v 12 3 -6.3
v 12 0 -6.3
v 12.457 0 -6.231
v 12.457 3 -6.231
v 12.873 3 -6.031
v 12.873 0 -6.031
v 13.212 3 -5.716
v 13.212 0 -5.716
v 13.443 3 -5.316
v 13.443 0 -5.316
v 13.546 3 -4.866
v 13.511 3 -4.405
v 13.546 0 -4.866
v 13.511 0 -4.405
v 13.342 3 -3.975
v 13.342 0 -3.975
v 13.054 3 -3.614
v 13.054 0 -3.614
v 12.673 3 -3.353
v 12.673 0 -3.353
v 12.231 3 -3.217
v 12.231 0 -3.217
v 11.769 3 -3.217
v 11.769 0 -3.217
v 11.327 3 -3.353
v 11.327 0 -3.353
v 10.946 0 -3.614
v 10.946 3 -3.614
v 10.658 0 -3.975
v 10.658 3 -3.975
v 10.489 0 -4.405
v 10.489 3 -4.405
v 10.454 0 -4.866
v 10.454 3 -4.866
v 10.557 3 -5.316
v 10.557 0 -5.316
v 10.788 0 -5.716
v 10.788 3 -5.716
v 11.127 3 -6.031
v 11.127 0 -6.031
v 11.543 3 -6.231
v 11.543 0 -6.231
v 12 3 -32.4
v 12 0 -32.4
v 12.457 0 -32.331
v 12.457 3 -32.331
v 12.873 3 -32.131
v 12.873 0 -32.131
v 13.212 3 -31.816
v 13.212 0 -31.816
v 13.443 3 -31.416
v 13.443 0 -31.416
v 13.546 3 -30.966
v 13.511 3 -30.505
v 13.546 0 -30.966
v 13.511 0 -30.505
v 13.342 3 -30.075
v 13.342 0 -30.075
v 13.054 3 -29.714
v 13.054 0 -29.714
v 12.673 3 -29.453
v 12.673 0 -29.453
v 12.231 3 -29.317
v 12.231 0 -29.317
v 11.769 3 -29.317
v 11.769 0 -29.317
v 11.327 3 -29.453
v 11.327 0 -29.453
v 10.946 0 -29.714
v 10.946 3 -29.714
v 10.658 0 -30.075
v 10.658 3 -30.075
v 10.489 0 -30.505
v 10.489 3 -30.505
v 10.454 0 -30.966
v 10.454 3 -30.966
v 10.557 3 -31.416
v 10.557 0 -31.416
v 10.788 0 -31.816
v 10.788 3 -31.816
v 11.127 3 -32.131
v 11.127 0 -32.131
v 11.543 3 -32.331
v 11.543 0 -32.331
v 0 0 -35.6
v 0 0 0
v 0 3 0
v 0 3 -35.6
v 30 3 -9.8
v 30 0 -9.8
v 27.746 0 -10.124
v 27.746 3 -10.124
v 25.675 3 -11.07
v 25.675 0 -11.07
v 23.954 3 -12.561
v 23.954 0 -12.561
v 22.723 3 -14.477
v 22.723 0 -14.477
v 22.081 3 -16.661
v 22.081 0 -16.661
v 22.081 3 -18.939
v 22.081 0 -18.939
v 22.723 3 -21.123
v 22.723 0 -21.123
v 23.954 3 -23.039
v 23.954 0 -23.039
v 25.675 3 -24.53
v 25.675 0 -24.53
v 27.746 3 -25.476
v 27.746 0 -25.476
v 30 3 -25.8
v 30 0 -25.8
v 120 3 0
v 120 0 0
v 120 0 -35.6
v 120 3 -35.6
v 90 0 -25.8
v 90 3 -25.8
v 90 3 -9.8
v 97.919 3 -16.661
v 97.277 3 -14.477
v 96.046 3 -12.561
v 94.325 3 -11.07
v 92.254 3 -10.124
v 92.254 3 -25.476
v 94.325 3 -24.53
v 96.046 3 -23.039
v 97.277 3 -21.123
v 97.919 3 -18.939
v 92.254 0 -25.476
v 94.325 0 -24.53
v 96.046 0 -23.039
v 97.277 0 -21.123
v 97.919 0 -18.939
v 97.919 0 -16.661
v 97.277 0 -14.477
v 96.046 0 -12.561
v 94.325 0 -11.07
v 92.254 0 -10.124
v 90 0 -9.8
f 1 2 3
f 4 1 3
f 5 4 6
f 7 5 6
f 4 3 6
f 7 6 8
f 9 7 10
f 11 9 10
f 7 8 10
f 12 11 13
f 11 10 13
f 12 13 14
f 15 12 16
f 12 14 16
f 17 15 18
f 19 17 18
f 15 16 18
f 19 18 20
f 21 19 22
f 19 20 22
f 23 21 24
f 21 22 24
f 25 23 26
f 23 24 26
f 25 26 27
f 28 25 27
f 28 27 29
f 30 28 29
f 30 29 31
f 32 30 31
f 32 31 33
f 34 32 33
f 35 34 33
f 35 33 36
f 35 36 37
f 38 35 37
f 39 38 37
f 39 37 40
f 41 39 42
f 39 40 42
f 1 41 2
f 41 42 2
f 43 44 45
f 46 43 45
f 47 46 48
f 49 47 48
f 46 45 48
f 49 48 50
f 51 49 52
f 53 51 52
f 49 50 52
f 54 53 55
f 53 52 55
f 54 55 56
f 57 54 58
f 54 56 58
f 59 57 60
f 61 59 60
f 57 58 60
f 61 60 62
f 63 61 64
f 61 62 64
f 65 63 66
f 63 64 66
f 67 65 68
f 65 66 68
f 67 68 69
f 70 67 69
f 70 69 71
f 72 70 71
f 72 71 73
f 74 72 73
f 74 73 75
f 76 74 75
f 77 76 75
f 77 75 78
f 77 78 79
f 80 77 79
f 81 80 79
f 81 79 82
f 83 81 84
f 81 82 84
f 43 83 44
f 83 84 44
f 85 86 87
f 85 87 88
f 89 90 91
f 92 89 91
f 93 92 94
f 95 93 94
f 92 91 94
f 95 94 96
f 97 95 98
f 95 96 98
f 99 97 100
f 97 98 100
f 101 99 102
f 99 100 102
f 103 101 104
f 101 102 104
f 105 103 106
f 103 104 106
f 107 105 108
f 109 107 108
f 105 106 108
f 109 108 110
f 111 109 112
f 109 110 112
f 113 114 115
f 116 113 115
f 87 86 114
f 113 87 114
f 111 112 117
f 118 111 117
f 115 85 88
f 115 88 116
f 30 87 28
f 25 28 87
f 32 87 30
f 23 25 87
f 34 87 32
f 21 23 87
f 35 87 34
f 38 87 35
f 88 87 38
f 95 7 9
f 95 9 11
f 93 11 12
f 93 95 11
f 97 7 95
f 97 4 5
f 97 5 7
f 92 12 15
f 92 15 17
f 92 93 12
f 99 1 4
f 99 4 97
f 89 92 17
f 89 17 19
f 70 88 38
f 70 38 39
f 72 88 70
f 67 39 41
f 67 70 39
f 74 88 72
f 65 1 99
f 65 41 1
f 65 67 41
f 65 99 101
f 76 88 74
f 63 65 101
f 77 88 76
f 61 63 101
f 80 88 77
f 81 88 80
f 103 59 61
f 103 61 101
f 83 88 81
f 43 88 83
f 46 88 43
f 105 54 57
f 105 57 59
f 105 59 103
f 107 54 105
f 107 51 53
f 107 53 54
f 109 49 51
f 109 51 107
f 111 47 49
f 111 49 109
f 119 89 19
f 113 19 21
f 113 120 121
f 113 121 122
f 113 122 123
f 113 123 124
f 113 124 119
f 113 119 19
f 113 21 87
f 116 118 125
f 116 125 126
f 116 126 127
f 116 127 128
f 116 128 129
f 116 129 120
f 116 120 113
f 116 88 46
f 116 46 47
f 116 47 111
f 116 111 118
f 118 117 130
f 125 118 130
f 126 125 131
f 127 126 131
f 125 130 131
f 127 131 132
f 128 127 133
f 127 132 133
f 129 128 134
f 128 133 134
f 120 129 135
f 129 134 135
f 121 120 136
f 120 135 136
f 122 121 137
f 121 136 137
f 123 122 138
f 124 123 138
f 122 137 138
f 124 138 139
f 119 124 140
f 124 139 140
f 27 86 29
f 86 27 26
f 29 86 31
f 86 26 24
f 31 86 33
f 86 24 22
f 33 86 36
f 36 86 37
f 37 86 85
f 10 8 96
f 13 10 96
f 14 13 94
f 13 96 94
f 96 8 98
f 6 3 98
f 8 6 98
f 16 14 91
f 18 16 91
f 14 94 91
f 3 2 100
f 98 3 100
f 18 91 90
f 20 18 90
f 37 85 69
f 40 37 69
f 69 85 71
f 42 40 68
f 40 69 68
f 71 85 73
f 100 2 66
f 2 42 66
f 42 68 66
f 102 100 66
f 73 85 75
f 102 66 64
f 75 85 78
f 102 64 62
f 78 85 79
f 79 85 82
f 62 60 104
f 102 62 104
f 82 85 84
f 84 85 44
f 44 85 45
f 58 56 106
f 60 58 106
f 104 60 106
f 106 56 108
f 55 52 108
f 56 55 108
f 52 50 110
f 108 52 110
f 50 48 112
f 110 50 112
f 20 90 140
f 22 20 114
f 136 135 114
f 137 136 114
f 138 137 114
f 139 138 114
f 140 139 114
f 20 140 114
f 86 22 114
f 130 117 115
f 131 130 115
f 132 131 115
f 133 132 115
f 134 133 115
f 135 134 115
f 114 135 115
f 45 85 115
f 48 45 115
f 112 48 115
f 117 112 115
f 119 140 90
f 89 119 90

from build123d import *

# Parameters (mm, degrees)
SKETCH_1_W          = 120
SKETCH_1_H          = 35.6
EXTRUDE_1_DEPTH     = 3
SKETCH_2_R          = 1.55
CUT_EXTRUDE_1_DEPTH = 3


with BuildPart() as part:
    # 草图1 → 凸台-拉伸1 (new body)
    with BuildSketch(Plane(origin=(0, 0, 0), x_dir=(1, 0, 0), z_dir=(0, 1, 0))):
        with Locations((60, 17.8)):
            Rectangle(SKETCH_1_W, SKETCH_1_H)
        with BuildLine():
            Line((30, 25.8), (90, 25.8))
            ThreePointArc((90, 25.8), (98, 17.8), (90, 9.8))
            Line((90, 9.8), (30, 9.8))
            ThreePointArc((30, 9.8), (22, 17.8), (30, 25.8))
        make_face(mode=Mode.SUBTRACT)
    extrude(amount=EXTRUDE_1_DEPTH)

    # 草图2 → 切除-拉伸1 (cut)
    with BuildSketch(Plane.XZ):
        with Locations((138, -4.75)):
            Circle(SKETCH_2_R)
        with Locations((138, -30.85)):
            Circle(SKETCH_2_R)
        with Locations(Location((12, -30.85, 0), (0, 0, 270))):
            Circle(SKETCH_2_R)
        with Locations(Location((12, -4.75, 0), (0, 0, 270))):
            Circle(SKETCH_2_R)
    extrude(amount=-CUT_EXTRUDE_1_DEPTH, mode=Mode.SUBTRACT)


solid = part.part
